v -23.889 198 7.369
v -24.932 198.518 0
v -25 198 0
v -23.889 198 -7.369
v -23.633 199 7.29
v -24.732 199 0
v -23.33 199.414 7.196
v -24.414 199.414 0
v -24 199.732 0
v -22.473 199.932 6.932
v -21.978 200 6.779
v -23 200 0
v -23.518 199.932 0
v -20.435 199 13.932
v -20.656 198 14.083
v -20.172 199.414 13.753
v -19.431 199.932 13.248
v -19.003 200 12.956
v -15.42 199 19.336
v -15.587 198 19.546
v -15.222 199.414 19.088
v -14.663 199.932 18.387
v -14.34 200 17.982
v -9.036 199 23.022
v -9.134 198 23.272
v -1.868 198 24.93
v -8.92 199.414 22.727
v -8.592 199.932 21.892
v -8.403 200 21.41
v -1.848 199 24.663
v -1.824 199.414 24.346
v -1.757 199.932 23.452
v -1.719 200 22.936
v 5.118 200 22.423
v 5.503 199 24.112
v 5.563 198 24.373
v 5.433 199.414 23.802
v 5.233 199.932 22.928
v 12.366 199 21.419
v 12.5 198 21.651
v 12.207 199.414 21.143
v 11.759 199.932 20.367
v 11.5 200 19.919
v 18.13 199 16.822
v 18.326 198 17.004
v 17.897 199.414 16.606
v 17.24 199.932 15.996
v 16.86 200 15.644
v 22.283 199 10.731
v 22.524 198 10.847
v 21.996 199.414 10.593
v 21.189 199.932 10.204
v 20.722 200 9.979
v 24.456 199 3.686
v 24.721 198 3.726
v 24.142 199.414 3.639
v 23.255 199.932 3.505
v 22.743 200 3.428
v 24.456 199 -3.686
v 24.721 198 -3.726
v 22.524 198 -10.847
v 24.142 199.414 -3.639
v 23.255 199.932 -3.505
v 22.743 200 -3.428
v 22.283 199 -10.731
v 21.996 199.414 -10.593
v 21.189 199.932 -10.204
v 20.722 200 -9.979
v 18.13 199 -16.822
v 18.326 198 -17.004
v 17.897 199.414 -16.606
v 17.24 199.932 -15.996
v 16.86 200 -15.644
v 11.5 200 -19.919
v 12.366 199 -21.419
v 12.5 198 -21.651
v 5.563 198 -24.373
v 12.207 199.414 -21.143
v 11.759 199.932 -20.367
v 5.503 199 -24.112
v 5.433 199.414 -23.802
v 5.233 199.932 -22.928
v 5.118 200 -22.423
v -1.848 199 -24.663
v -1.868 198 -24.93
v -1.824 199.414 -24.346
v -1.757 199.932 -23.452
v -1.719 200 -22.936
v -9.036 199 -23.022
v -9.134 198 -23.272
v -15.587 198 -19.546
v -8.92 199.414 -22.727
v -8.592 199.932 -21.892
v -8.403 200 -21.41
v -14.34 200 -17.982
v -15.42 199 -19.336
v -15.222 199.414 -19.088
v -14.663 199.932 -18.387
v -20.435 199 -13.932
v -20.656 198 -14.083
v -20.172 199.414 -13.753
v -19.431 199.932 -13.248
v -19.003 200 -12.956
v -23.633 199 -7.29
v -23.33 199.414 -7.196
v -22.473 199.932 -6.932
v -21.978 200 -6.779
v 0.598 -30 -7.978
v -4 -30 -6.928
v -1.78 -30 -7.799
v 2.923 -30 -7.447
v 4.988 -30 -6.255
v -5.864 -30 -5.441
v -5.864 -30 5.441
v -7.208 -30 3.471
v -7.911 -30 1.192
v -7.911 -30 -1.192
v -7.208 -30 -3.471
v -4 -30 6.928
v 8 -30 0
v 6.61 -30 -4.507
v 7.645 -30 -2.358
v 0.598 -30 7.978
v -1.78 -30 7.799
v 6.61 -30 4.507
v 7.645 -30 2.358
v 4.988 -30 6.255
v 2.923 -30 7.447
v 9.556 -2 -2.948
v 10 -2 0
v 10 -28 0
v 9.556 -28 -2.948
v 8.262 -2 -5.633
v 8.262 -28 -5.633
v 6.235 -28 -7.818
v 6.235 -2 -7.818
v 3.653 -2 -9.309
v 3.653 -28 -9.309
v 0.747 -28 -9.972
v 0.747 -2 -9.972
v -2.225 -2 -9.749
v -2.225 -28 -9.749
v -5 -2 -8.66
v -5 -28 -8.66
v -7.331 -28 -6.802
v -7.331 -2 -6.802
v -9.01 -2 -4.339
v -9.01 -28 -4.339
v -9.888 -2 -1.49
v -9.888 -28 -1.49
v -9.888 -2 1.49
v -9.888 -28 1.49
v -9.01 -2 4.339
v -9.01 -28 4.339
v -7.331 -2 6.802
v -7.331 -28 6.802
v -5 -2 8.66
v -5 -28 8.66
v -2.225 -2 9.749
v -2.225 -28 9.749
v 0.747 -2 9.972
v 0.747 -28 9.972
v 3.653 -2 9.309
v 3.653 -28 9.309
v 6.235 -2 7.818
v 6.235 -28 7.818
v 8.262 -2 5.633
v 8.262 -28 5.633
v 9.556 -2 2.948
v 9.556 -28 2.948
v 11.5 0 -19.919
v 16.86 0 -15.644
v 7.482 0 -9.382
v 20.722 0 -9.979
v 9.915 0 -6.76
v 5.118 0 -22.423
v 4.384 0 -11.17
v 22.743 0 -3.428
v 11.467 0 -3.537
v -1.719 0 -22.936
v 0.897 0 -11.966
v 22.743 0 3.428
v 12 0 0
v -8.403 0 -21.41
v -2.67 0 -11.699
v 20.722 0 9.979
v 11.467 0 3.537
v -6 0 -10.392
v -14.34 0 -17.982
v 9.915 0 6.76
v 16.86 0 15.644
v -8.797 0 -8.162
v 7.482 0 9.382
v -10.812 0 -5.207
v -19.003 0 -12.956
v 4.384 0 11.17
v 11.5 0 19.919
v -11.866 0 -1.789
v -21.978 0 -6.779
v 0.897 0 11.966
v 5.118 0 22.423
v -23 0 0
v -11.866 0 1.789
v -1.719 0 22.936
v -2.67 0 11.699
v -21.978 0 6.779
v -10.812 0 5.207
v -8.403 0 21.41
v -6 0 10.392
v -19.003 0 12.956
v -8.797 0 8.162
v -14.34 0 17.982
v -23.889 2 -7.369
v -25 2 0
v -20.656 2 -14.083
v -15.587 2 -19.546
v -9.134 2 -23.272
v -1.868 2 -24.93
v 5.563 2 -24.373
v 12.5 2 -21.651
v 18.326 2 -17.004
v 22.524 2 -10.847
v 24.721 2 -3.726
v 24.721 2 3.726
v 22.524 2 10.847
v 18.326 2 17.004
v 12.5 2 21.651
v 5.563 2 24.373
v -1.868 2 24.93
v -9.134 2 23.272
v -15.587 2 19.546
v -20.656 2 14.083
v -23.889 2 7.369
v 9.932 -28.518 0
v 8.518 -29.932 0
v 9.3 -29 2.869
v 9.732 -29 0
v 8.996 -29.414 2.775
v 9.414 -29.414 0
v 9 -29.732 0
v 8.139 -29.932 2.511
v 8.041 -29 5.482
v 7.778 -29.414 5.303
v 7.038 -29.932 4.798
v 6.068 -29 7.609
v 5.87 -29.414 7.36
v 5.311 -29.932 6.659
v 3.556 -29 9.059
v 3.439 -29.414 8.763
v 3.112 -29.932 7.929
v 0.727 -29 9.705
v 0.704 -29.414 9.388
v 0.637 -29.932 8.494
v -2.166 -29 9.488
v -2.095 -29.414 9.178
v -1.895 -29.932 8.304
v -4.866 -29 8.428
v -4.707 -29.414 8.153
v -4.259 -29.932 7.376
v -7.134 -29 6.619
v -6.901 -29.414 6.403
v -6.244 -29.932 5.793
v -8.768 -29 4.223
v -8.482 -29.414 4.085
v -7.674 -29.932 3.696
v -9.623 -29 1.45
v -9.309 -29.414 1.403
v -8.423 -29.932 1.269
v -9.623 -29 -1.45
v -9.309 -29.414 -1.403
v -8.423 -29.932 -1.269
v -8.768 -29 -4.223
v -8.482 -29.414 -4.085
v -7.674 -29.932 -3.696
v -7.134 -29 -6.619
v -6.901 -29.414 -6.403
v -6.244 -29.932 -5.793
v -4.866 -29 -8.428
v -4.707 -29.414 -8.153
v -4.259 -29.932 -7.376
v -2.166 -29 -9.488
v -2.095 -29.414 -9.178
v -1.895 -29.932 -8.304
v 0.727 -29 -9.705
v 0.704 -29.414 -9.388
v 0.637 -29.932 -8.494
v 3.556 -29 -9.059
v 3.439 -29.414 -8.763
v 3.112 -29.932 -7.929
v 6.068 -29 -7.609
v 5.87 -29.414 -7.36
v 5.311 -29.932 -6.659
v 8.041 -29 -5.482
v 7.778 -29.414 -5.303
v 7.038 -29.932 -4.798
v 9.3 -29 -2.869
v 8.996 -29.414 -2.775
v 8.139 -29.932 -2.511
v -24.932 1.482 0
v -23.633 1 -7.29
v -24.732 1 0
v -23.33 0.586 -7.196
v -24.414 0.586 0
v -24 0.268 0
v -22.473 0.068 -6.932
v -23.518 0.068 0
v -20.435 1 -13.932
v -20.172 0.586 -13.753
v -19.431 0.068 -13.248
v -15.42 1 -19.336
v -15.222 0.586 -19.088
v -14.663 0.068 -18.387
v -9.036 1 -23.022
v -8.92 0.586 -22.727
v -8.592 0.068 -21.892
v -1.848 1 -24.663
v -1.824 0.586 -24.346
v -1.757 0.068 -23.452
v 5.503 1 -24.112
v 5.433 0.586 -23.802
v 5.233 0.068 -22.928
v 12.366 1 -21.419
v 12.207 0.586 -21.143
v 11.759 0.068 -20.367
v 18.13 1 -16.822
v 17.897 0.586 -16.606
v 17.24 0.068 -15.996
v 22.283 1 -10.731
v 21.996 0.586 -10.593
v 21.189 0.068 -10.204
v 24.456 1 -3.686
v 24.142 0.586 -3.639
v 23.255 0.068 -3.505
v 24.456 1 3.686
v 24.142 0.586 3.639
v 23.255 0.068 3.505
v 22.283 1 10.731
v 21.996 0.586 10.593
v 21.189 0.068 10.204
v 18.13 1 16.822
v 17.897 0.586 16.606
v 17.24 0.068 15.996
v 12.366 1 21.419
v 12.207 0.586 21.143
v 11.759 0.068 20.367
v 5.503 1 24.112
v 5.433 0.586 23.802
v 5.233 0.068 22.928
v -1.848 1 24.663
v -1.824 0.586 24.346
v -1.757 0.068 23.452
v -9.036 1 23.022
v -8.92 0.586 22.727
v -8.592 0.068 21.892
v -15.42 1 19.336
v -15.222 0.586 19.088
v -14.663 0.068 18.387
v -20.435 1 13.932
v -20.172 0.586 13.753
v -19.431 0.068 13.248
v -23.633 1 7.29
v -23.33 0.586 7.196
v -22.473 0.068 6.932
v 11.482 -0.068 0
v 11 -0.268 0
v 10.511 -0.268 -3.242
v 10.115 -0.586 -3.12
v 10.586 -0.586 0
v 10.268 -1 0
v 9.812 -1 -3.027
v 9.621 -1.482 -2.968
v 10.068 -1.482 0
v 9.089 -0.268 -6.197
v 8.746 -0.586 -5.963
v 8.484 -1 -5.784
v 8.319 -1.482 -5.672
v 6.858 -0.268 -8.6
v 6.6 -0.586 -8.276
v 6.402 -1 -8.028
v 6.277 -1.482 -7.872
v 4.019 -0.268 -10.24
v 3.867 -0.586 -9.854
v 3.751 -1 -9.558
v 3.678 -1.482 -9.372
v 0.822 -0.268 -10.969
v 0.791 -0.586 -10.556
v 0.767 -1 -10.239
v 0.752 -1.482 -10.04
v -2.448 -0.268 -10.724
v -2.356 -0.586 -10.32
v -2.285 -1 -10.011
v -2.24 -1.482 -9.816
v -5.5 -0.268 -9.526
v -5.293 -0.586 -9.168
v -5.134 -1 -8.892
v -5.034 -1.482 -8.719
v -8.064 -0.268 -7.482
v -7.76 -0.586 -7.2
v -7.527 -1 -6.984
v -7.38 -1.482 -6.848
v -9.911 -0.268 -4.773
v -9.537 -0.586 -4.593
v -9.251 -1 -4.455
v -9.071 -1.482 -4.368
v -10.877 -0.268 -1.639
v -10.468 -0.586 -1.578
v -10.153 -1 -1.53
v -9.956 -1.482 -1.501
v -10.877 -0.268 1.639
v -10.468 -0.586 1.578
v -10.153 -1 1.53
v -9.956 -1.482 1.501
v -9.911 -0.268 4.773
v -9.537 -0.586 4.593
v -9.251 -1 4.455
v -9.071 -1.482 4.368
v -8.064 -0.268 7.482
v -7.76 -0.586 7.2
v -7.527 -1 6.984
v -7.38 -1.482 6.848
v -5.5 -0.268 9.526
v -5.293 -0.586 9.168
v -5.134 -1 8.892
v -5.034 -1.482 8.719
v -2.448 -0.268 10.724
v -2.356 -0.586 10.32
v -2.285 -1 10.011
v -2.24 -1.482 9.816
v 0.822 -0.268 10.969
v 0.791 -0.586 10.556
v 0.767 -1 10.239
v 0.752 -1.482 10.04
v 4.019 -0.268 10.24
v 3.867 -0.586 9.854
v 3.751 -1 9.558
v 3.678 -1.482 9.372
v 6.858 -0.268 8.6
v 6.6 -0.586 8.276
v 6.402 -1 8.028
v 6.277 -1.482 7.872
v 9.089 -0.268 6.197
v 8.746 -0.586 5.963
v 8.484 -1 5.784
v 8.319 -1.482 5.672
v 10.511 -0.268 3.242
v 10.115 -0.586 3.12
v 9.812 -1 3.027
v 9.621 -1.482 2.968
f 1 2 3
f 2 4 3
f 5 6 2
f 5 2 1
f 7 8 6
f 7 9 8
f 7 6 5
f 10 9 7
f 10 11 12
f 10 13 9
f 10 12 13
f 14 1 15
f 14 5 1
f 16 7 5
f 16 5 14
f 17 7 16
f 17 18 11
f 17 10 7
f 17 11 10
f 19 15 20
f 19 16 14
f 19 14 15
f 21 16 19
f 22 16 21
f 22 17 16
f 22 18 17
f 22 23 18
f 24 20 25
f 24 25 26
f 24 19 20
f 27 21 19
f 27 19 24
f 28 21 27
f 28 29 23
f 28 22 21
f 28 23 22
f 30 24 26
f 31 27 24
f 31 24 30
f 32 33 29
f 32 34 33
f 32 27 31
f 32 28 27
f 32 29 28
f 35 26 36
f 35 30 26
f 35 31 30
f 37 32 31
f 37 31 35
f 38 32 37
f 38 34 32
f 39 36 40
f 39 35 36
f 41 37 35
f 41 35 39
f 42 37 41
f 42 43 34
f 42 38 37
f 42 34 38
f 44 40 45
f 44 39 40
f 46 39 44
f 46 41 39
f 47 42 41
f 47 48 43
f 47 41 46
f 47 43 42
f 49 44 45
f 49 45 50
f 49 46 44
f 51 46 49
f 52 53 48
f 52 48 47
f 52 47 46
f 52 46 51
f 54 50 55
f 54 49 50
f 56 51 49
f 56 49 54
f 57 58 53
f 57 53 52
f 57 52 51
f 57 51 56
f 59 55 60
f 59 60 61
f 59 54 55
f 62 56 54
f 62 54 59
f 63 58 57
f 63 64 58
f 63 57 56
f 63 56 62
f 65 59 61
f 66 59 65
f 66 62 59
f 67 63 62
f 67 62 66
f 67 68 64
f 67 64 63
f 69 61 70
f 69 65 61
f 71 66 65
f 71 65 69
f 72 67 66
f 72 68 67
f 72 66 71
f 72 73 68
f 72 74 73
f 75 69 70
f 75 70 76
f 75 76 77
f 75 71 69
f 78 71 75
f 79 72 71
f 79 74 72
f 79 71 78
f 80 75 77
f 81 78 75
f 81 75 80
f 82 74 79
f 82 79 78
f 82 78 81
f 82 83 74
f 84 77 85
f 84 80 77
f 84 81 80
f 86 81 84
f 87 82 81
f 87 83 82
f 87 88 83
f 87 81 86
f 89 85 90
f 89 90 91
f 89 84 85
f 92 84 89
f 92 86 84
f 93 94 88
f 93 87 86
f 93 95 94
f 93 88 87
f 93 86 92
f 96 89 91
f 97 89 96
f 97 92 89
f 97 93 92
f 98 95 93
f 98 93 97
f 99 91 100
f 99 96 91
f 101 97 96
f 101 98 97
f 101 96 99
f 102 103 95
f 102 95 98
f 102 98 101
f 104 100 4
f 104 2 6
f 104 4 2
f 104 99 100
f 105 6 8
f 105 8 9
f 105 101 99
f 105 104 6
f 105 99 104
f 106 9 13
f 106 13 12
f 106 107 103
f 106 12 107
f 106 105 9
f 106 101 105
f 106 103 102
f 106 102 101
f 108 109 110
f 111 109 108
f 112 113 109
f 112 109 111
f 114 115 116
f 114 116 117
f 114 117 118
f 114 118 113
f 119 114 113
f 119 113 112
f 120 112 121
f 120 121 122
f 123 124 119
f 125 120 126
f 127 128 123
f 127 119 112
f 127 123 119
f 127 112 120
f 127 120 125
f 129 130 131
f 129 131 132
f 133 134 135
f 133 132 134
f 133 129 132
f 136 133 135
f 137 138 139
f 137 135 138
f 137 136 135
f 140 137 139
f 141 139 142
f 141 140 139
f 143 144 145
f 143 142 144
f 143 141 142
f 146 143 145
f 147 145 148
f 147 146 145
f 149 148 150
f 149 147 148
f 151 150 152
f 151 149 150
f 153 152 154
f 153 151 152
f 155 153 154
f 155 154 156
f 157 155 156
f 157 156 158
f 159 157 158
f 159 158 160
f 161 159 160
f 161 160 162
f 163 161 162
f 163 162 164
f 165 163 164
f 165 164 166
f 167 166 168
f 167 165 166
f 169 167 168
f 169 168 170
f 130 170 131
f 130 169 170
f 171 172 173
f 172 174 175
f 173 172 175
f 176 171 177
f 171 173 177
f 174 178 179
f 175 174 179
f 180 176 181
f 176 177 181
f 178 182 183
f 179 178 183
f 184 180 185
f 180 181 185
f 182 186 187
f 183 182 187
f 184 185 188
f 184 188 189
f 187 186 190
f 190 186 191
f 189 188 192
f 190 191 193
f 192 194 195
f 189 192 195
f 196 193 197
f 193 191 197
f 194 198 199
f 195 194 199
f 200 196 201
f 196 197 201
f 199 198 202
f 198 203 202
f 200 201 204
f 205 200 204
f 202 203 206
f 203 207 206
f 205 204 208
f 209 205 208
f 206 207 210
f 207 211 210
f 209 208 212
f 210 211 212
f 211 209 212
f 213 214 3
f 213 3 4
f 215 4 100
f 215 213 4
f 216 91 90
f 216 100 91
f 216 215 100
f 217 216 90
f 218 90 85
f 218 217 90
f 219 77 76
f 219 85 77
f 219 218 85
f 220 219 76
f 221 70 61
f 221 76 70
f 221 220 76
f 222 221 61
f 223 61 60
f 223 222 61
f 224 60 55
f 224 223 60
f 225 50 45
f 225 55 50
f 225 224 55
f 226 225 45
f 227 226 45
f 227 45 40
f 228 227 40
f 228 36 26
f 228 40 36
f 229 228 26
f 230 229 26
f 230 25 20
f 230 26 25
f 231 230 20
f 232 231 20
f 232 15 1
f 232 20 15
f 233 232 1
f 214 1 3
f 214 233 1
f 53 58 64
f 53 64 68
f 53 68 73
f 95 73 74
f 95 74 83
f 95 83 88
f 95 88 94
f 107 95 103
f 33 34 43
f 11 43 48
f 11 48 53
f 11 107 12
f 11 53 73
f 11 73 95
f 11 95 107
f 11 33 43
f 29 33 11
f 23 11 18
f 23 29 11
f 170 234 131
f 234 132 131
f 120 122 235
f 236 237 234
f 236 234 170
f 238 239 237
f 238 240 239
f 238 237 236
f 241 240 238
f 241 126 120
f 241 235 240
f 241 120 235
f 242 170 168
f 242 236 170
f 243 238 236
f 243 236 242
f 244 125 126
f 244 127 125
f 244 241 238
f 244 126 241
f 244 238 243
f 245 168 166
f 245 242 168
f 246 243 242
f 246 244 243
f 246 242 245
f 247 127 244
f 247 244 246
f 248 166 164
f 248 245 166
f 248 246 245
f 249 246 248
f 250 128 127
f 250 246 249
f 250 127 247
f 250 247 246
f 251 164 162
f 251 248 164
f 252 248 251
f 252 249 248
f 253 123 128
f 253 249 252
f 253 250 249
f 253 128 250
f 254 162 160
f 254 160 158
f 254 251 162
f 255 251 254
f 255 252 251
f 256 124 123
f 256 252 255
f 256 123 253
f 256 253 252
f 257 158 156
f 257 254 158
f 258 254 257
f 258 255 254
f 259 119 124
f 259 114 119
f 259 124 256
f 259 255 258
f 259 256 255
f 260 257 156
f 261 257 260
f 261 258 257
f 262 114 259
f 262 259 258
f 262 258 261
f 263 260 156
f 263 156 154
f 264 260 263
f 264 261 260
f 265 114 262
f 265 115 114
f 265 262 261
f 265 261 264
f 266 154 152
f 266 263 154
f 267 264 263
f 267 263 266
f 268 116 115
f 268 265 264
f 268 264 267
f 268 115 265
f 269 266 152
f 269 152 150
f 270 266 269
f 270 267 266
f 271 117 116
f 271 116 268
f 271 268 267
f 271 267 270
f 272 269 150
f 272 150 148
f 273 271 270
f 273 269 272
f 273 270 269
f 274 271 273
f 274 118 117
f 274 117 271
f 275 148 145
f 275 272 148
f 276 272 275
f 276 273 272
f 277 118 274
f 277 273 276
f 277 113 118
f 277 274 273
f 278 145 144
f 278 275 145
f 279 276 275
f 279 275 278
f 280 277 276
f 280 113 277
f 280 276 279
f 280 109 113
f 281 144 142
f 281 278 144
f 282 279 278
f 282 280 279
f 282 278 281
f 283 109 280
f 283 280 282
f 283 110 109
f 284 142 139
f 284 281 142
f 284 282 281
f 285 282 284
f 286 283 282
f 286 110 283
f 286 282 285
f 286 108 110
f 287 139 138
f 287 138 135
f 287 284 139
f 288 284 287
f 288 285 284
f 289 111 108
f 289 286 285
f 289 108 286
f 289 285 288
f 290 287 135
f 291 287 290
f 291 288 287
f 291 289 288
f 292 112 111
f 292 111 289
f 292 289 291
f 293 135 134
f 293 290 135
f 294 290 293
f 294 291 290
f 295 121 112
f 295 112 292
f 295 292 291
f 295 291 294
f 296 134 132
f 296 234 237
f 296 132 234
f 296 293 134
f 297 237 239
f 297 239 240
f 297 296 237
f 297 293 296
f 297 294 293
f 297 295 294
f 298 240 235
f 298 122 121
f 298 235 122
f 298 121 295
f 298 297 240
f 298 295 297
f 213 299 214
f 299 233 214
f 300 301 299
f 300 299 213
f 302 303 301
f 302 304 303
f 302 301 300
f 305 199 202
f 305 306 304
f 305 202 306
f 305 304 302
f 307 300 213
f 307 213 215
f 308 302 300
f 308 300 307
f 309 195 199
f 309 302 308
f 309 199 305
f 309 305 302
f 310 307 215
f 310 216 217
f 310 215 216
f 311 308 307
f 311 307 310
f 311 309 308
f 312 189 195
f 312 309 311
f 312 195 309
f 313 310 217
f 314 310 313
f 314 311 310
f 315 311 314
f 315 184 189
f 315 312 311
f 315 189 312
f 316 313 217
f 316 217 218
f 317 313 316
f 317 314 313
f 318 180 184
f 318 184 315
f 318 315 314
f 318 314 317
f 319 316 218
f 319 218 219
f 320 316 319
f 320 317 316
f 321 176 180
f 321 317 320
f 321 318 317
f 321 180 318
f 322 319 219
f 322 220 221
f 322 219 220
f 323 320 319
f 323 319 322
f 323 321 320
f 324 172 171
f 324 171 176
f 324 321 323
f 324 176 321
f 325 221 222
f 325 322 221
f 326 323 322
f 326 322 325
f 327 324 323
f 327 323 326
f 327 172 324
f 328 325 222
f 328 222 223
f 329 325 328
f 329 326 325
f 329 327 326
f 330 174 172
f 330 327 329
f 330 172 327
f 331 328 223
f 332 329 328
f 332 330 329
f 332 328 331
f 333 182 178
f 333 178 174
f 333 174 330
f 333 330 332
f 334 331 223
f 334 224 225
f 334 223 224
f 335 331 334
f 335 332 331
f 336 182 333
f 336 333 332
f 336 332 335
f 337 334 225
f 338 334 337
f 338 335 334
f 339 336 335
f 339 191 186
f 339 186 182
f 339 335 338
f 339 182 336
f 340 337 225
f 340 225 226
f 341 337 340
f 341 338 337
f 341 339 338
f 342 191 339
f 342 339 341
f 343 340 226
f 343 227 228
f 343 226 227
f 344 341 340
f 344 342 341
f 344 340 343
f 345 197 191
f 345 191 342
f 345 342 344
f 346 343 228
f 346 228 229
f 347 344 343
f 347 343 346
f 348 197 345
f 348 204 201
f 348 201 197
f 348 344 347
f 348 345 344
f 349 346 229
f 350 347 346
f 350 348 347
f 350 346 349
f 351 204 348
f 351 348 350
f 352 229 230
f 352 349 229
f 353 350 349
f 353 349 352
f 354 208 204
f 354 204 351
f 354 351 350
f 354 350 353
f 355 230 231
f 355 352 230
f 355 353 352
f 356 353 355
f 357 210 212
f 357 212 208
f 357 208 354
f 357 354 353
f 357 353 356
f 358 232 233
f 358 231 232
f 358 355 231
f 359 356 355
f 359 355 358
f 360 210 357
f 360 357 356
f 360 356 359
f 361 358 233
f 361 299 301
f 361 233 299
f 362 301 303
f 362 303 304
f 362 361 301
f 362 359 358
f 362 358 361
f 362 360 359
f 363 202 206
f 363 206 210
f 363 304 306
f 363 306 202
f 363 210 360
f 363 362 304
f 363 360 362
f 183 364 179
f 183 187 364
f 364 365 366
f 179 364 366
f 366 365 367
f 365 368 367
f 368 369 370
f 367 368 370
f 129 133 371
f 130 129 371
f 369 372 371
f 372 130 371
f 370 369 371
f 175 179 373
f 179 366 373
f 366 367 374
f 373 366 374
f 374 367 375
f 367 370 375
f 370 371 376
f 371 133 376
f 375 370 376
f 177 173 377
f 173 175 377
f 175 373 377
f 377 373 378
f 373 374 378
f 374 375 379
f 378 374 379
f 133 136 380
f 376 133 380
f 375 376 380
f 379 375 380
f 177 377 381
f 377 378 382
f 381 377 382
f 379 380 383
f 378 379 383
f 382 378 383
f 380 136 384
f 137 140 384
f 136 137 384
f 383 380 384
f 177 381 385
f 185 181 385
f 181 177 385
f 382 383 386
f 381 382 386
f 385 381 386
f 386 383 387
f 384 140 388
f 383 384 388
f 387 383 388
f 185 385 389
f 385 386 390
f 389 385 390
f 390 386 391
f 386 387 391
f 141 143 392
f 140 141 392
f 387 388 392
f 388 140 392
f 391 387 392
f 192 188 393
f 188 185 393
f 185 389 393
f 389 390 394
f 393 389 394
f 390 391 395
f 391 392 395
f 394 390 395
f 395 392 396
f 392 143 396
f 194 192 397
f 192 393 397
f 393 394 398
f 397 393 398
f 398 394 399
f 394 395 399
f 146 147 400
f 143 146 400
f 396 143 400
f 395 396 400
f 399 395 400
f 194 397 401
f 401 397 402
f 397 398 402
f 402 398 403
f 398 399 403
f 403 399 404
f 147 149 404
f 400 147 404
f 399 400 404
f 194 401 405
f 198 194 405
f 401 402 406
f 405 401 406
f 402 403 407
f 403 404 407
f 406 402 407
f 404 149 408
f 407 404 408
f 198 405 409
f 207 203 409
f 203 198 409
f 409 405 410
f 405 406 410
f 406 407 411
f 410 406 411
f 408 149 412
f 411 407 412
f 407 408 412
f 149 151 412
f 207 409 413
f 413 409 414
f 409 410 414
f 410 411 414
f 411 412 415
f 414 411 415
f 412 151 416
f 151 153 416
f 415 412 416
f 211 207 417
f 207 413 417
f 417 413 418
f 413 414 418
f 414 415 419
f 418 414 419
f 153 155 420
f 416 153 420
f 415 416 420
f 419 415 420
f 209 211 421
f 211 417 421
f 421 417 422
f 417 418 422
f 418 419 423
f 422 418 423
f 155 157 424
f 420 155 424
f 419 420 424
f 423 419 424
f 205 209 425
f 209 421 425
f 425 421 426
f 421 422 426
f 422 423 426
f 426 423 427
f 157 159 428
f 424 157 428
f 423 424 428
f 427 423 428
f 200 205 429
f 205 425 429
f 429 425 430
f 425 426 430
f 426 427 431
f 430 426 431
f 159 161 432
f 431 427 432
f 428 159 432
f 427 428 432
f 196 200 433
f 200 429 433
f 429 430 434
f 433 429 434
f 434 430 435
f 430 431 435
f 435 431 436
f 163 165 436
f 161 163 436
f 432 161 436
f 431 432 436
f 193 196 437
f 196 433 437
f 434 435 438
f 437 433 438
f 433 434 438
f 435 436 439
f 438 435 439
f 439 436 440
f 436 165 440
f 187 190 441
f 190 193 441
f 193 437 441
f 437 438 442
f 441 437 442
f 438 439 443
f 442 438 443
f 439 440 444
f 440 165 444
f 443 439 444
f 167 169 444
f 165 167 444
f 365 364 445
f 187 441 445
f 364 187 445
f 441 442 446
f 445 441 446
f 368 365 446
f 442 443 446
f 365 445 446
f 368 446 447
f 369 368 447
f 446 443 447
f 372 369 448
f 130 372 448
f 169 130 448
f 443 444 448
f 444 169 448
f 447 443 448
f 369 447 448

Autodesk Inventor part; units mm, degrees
ref_plane "YZ Plane" through (0, 0, 0) normal (1, 0, 0) x (0, 1, 0)
ref_plane "XZ Plane" through (0, 0, 0) normal (0, 1, 0) x (-1, 0, 0)
ref_plane "XY Plane" through (0, 0, 0) normal (0, 0, 1) x (1, 0, 0)
sketch "Sketch2" plane through (0, 0, 0) normal (0, 1, 0) x (-1, 0, 0)
  circle A0 centre (0, 0) radius 25
  dimension "d0" = 50
extrude "Extrusion1" add sketch "Sketch2" along normal blind 200
sketch "Sketch3" plane through (0, 0, 0) normal (0, -1, 0) x (1, 0, 0)
  circle A0 centre (0, 0) radius 10
  dimension "d3" = 20
extrude "Extrusion2" add sketch "Sketch3" along normal blind 30
fillet "Fillet1" radius 2 3 edges at (25, 0, 0) (-10, -30, 0) (-10, 0, 0)
fillet "Fillet2" radius 2 1 edges at (25, 200, 0)
properties part number "plasmatorch"
